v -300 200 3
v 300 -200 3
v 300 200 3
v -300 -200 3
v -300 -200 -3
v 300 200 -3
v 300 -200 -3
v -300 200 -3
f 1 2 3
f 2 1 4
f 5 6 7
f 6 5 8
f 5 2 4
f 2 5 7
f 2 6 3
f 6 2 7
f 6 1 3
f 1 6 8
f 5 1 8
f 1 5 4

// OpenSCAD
$fn = 64;

length = 600;   // mm
width  = 400;   // mm
thick  = 6;     // mm (MDF sheet thickness)

color([0.78, 0.67, 0.50])
cube([length, width, thick], center=true);
